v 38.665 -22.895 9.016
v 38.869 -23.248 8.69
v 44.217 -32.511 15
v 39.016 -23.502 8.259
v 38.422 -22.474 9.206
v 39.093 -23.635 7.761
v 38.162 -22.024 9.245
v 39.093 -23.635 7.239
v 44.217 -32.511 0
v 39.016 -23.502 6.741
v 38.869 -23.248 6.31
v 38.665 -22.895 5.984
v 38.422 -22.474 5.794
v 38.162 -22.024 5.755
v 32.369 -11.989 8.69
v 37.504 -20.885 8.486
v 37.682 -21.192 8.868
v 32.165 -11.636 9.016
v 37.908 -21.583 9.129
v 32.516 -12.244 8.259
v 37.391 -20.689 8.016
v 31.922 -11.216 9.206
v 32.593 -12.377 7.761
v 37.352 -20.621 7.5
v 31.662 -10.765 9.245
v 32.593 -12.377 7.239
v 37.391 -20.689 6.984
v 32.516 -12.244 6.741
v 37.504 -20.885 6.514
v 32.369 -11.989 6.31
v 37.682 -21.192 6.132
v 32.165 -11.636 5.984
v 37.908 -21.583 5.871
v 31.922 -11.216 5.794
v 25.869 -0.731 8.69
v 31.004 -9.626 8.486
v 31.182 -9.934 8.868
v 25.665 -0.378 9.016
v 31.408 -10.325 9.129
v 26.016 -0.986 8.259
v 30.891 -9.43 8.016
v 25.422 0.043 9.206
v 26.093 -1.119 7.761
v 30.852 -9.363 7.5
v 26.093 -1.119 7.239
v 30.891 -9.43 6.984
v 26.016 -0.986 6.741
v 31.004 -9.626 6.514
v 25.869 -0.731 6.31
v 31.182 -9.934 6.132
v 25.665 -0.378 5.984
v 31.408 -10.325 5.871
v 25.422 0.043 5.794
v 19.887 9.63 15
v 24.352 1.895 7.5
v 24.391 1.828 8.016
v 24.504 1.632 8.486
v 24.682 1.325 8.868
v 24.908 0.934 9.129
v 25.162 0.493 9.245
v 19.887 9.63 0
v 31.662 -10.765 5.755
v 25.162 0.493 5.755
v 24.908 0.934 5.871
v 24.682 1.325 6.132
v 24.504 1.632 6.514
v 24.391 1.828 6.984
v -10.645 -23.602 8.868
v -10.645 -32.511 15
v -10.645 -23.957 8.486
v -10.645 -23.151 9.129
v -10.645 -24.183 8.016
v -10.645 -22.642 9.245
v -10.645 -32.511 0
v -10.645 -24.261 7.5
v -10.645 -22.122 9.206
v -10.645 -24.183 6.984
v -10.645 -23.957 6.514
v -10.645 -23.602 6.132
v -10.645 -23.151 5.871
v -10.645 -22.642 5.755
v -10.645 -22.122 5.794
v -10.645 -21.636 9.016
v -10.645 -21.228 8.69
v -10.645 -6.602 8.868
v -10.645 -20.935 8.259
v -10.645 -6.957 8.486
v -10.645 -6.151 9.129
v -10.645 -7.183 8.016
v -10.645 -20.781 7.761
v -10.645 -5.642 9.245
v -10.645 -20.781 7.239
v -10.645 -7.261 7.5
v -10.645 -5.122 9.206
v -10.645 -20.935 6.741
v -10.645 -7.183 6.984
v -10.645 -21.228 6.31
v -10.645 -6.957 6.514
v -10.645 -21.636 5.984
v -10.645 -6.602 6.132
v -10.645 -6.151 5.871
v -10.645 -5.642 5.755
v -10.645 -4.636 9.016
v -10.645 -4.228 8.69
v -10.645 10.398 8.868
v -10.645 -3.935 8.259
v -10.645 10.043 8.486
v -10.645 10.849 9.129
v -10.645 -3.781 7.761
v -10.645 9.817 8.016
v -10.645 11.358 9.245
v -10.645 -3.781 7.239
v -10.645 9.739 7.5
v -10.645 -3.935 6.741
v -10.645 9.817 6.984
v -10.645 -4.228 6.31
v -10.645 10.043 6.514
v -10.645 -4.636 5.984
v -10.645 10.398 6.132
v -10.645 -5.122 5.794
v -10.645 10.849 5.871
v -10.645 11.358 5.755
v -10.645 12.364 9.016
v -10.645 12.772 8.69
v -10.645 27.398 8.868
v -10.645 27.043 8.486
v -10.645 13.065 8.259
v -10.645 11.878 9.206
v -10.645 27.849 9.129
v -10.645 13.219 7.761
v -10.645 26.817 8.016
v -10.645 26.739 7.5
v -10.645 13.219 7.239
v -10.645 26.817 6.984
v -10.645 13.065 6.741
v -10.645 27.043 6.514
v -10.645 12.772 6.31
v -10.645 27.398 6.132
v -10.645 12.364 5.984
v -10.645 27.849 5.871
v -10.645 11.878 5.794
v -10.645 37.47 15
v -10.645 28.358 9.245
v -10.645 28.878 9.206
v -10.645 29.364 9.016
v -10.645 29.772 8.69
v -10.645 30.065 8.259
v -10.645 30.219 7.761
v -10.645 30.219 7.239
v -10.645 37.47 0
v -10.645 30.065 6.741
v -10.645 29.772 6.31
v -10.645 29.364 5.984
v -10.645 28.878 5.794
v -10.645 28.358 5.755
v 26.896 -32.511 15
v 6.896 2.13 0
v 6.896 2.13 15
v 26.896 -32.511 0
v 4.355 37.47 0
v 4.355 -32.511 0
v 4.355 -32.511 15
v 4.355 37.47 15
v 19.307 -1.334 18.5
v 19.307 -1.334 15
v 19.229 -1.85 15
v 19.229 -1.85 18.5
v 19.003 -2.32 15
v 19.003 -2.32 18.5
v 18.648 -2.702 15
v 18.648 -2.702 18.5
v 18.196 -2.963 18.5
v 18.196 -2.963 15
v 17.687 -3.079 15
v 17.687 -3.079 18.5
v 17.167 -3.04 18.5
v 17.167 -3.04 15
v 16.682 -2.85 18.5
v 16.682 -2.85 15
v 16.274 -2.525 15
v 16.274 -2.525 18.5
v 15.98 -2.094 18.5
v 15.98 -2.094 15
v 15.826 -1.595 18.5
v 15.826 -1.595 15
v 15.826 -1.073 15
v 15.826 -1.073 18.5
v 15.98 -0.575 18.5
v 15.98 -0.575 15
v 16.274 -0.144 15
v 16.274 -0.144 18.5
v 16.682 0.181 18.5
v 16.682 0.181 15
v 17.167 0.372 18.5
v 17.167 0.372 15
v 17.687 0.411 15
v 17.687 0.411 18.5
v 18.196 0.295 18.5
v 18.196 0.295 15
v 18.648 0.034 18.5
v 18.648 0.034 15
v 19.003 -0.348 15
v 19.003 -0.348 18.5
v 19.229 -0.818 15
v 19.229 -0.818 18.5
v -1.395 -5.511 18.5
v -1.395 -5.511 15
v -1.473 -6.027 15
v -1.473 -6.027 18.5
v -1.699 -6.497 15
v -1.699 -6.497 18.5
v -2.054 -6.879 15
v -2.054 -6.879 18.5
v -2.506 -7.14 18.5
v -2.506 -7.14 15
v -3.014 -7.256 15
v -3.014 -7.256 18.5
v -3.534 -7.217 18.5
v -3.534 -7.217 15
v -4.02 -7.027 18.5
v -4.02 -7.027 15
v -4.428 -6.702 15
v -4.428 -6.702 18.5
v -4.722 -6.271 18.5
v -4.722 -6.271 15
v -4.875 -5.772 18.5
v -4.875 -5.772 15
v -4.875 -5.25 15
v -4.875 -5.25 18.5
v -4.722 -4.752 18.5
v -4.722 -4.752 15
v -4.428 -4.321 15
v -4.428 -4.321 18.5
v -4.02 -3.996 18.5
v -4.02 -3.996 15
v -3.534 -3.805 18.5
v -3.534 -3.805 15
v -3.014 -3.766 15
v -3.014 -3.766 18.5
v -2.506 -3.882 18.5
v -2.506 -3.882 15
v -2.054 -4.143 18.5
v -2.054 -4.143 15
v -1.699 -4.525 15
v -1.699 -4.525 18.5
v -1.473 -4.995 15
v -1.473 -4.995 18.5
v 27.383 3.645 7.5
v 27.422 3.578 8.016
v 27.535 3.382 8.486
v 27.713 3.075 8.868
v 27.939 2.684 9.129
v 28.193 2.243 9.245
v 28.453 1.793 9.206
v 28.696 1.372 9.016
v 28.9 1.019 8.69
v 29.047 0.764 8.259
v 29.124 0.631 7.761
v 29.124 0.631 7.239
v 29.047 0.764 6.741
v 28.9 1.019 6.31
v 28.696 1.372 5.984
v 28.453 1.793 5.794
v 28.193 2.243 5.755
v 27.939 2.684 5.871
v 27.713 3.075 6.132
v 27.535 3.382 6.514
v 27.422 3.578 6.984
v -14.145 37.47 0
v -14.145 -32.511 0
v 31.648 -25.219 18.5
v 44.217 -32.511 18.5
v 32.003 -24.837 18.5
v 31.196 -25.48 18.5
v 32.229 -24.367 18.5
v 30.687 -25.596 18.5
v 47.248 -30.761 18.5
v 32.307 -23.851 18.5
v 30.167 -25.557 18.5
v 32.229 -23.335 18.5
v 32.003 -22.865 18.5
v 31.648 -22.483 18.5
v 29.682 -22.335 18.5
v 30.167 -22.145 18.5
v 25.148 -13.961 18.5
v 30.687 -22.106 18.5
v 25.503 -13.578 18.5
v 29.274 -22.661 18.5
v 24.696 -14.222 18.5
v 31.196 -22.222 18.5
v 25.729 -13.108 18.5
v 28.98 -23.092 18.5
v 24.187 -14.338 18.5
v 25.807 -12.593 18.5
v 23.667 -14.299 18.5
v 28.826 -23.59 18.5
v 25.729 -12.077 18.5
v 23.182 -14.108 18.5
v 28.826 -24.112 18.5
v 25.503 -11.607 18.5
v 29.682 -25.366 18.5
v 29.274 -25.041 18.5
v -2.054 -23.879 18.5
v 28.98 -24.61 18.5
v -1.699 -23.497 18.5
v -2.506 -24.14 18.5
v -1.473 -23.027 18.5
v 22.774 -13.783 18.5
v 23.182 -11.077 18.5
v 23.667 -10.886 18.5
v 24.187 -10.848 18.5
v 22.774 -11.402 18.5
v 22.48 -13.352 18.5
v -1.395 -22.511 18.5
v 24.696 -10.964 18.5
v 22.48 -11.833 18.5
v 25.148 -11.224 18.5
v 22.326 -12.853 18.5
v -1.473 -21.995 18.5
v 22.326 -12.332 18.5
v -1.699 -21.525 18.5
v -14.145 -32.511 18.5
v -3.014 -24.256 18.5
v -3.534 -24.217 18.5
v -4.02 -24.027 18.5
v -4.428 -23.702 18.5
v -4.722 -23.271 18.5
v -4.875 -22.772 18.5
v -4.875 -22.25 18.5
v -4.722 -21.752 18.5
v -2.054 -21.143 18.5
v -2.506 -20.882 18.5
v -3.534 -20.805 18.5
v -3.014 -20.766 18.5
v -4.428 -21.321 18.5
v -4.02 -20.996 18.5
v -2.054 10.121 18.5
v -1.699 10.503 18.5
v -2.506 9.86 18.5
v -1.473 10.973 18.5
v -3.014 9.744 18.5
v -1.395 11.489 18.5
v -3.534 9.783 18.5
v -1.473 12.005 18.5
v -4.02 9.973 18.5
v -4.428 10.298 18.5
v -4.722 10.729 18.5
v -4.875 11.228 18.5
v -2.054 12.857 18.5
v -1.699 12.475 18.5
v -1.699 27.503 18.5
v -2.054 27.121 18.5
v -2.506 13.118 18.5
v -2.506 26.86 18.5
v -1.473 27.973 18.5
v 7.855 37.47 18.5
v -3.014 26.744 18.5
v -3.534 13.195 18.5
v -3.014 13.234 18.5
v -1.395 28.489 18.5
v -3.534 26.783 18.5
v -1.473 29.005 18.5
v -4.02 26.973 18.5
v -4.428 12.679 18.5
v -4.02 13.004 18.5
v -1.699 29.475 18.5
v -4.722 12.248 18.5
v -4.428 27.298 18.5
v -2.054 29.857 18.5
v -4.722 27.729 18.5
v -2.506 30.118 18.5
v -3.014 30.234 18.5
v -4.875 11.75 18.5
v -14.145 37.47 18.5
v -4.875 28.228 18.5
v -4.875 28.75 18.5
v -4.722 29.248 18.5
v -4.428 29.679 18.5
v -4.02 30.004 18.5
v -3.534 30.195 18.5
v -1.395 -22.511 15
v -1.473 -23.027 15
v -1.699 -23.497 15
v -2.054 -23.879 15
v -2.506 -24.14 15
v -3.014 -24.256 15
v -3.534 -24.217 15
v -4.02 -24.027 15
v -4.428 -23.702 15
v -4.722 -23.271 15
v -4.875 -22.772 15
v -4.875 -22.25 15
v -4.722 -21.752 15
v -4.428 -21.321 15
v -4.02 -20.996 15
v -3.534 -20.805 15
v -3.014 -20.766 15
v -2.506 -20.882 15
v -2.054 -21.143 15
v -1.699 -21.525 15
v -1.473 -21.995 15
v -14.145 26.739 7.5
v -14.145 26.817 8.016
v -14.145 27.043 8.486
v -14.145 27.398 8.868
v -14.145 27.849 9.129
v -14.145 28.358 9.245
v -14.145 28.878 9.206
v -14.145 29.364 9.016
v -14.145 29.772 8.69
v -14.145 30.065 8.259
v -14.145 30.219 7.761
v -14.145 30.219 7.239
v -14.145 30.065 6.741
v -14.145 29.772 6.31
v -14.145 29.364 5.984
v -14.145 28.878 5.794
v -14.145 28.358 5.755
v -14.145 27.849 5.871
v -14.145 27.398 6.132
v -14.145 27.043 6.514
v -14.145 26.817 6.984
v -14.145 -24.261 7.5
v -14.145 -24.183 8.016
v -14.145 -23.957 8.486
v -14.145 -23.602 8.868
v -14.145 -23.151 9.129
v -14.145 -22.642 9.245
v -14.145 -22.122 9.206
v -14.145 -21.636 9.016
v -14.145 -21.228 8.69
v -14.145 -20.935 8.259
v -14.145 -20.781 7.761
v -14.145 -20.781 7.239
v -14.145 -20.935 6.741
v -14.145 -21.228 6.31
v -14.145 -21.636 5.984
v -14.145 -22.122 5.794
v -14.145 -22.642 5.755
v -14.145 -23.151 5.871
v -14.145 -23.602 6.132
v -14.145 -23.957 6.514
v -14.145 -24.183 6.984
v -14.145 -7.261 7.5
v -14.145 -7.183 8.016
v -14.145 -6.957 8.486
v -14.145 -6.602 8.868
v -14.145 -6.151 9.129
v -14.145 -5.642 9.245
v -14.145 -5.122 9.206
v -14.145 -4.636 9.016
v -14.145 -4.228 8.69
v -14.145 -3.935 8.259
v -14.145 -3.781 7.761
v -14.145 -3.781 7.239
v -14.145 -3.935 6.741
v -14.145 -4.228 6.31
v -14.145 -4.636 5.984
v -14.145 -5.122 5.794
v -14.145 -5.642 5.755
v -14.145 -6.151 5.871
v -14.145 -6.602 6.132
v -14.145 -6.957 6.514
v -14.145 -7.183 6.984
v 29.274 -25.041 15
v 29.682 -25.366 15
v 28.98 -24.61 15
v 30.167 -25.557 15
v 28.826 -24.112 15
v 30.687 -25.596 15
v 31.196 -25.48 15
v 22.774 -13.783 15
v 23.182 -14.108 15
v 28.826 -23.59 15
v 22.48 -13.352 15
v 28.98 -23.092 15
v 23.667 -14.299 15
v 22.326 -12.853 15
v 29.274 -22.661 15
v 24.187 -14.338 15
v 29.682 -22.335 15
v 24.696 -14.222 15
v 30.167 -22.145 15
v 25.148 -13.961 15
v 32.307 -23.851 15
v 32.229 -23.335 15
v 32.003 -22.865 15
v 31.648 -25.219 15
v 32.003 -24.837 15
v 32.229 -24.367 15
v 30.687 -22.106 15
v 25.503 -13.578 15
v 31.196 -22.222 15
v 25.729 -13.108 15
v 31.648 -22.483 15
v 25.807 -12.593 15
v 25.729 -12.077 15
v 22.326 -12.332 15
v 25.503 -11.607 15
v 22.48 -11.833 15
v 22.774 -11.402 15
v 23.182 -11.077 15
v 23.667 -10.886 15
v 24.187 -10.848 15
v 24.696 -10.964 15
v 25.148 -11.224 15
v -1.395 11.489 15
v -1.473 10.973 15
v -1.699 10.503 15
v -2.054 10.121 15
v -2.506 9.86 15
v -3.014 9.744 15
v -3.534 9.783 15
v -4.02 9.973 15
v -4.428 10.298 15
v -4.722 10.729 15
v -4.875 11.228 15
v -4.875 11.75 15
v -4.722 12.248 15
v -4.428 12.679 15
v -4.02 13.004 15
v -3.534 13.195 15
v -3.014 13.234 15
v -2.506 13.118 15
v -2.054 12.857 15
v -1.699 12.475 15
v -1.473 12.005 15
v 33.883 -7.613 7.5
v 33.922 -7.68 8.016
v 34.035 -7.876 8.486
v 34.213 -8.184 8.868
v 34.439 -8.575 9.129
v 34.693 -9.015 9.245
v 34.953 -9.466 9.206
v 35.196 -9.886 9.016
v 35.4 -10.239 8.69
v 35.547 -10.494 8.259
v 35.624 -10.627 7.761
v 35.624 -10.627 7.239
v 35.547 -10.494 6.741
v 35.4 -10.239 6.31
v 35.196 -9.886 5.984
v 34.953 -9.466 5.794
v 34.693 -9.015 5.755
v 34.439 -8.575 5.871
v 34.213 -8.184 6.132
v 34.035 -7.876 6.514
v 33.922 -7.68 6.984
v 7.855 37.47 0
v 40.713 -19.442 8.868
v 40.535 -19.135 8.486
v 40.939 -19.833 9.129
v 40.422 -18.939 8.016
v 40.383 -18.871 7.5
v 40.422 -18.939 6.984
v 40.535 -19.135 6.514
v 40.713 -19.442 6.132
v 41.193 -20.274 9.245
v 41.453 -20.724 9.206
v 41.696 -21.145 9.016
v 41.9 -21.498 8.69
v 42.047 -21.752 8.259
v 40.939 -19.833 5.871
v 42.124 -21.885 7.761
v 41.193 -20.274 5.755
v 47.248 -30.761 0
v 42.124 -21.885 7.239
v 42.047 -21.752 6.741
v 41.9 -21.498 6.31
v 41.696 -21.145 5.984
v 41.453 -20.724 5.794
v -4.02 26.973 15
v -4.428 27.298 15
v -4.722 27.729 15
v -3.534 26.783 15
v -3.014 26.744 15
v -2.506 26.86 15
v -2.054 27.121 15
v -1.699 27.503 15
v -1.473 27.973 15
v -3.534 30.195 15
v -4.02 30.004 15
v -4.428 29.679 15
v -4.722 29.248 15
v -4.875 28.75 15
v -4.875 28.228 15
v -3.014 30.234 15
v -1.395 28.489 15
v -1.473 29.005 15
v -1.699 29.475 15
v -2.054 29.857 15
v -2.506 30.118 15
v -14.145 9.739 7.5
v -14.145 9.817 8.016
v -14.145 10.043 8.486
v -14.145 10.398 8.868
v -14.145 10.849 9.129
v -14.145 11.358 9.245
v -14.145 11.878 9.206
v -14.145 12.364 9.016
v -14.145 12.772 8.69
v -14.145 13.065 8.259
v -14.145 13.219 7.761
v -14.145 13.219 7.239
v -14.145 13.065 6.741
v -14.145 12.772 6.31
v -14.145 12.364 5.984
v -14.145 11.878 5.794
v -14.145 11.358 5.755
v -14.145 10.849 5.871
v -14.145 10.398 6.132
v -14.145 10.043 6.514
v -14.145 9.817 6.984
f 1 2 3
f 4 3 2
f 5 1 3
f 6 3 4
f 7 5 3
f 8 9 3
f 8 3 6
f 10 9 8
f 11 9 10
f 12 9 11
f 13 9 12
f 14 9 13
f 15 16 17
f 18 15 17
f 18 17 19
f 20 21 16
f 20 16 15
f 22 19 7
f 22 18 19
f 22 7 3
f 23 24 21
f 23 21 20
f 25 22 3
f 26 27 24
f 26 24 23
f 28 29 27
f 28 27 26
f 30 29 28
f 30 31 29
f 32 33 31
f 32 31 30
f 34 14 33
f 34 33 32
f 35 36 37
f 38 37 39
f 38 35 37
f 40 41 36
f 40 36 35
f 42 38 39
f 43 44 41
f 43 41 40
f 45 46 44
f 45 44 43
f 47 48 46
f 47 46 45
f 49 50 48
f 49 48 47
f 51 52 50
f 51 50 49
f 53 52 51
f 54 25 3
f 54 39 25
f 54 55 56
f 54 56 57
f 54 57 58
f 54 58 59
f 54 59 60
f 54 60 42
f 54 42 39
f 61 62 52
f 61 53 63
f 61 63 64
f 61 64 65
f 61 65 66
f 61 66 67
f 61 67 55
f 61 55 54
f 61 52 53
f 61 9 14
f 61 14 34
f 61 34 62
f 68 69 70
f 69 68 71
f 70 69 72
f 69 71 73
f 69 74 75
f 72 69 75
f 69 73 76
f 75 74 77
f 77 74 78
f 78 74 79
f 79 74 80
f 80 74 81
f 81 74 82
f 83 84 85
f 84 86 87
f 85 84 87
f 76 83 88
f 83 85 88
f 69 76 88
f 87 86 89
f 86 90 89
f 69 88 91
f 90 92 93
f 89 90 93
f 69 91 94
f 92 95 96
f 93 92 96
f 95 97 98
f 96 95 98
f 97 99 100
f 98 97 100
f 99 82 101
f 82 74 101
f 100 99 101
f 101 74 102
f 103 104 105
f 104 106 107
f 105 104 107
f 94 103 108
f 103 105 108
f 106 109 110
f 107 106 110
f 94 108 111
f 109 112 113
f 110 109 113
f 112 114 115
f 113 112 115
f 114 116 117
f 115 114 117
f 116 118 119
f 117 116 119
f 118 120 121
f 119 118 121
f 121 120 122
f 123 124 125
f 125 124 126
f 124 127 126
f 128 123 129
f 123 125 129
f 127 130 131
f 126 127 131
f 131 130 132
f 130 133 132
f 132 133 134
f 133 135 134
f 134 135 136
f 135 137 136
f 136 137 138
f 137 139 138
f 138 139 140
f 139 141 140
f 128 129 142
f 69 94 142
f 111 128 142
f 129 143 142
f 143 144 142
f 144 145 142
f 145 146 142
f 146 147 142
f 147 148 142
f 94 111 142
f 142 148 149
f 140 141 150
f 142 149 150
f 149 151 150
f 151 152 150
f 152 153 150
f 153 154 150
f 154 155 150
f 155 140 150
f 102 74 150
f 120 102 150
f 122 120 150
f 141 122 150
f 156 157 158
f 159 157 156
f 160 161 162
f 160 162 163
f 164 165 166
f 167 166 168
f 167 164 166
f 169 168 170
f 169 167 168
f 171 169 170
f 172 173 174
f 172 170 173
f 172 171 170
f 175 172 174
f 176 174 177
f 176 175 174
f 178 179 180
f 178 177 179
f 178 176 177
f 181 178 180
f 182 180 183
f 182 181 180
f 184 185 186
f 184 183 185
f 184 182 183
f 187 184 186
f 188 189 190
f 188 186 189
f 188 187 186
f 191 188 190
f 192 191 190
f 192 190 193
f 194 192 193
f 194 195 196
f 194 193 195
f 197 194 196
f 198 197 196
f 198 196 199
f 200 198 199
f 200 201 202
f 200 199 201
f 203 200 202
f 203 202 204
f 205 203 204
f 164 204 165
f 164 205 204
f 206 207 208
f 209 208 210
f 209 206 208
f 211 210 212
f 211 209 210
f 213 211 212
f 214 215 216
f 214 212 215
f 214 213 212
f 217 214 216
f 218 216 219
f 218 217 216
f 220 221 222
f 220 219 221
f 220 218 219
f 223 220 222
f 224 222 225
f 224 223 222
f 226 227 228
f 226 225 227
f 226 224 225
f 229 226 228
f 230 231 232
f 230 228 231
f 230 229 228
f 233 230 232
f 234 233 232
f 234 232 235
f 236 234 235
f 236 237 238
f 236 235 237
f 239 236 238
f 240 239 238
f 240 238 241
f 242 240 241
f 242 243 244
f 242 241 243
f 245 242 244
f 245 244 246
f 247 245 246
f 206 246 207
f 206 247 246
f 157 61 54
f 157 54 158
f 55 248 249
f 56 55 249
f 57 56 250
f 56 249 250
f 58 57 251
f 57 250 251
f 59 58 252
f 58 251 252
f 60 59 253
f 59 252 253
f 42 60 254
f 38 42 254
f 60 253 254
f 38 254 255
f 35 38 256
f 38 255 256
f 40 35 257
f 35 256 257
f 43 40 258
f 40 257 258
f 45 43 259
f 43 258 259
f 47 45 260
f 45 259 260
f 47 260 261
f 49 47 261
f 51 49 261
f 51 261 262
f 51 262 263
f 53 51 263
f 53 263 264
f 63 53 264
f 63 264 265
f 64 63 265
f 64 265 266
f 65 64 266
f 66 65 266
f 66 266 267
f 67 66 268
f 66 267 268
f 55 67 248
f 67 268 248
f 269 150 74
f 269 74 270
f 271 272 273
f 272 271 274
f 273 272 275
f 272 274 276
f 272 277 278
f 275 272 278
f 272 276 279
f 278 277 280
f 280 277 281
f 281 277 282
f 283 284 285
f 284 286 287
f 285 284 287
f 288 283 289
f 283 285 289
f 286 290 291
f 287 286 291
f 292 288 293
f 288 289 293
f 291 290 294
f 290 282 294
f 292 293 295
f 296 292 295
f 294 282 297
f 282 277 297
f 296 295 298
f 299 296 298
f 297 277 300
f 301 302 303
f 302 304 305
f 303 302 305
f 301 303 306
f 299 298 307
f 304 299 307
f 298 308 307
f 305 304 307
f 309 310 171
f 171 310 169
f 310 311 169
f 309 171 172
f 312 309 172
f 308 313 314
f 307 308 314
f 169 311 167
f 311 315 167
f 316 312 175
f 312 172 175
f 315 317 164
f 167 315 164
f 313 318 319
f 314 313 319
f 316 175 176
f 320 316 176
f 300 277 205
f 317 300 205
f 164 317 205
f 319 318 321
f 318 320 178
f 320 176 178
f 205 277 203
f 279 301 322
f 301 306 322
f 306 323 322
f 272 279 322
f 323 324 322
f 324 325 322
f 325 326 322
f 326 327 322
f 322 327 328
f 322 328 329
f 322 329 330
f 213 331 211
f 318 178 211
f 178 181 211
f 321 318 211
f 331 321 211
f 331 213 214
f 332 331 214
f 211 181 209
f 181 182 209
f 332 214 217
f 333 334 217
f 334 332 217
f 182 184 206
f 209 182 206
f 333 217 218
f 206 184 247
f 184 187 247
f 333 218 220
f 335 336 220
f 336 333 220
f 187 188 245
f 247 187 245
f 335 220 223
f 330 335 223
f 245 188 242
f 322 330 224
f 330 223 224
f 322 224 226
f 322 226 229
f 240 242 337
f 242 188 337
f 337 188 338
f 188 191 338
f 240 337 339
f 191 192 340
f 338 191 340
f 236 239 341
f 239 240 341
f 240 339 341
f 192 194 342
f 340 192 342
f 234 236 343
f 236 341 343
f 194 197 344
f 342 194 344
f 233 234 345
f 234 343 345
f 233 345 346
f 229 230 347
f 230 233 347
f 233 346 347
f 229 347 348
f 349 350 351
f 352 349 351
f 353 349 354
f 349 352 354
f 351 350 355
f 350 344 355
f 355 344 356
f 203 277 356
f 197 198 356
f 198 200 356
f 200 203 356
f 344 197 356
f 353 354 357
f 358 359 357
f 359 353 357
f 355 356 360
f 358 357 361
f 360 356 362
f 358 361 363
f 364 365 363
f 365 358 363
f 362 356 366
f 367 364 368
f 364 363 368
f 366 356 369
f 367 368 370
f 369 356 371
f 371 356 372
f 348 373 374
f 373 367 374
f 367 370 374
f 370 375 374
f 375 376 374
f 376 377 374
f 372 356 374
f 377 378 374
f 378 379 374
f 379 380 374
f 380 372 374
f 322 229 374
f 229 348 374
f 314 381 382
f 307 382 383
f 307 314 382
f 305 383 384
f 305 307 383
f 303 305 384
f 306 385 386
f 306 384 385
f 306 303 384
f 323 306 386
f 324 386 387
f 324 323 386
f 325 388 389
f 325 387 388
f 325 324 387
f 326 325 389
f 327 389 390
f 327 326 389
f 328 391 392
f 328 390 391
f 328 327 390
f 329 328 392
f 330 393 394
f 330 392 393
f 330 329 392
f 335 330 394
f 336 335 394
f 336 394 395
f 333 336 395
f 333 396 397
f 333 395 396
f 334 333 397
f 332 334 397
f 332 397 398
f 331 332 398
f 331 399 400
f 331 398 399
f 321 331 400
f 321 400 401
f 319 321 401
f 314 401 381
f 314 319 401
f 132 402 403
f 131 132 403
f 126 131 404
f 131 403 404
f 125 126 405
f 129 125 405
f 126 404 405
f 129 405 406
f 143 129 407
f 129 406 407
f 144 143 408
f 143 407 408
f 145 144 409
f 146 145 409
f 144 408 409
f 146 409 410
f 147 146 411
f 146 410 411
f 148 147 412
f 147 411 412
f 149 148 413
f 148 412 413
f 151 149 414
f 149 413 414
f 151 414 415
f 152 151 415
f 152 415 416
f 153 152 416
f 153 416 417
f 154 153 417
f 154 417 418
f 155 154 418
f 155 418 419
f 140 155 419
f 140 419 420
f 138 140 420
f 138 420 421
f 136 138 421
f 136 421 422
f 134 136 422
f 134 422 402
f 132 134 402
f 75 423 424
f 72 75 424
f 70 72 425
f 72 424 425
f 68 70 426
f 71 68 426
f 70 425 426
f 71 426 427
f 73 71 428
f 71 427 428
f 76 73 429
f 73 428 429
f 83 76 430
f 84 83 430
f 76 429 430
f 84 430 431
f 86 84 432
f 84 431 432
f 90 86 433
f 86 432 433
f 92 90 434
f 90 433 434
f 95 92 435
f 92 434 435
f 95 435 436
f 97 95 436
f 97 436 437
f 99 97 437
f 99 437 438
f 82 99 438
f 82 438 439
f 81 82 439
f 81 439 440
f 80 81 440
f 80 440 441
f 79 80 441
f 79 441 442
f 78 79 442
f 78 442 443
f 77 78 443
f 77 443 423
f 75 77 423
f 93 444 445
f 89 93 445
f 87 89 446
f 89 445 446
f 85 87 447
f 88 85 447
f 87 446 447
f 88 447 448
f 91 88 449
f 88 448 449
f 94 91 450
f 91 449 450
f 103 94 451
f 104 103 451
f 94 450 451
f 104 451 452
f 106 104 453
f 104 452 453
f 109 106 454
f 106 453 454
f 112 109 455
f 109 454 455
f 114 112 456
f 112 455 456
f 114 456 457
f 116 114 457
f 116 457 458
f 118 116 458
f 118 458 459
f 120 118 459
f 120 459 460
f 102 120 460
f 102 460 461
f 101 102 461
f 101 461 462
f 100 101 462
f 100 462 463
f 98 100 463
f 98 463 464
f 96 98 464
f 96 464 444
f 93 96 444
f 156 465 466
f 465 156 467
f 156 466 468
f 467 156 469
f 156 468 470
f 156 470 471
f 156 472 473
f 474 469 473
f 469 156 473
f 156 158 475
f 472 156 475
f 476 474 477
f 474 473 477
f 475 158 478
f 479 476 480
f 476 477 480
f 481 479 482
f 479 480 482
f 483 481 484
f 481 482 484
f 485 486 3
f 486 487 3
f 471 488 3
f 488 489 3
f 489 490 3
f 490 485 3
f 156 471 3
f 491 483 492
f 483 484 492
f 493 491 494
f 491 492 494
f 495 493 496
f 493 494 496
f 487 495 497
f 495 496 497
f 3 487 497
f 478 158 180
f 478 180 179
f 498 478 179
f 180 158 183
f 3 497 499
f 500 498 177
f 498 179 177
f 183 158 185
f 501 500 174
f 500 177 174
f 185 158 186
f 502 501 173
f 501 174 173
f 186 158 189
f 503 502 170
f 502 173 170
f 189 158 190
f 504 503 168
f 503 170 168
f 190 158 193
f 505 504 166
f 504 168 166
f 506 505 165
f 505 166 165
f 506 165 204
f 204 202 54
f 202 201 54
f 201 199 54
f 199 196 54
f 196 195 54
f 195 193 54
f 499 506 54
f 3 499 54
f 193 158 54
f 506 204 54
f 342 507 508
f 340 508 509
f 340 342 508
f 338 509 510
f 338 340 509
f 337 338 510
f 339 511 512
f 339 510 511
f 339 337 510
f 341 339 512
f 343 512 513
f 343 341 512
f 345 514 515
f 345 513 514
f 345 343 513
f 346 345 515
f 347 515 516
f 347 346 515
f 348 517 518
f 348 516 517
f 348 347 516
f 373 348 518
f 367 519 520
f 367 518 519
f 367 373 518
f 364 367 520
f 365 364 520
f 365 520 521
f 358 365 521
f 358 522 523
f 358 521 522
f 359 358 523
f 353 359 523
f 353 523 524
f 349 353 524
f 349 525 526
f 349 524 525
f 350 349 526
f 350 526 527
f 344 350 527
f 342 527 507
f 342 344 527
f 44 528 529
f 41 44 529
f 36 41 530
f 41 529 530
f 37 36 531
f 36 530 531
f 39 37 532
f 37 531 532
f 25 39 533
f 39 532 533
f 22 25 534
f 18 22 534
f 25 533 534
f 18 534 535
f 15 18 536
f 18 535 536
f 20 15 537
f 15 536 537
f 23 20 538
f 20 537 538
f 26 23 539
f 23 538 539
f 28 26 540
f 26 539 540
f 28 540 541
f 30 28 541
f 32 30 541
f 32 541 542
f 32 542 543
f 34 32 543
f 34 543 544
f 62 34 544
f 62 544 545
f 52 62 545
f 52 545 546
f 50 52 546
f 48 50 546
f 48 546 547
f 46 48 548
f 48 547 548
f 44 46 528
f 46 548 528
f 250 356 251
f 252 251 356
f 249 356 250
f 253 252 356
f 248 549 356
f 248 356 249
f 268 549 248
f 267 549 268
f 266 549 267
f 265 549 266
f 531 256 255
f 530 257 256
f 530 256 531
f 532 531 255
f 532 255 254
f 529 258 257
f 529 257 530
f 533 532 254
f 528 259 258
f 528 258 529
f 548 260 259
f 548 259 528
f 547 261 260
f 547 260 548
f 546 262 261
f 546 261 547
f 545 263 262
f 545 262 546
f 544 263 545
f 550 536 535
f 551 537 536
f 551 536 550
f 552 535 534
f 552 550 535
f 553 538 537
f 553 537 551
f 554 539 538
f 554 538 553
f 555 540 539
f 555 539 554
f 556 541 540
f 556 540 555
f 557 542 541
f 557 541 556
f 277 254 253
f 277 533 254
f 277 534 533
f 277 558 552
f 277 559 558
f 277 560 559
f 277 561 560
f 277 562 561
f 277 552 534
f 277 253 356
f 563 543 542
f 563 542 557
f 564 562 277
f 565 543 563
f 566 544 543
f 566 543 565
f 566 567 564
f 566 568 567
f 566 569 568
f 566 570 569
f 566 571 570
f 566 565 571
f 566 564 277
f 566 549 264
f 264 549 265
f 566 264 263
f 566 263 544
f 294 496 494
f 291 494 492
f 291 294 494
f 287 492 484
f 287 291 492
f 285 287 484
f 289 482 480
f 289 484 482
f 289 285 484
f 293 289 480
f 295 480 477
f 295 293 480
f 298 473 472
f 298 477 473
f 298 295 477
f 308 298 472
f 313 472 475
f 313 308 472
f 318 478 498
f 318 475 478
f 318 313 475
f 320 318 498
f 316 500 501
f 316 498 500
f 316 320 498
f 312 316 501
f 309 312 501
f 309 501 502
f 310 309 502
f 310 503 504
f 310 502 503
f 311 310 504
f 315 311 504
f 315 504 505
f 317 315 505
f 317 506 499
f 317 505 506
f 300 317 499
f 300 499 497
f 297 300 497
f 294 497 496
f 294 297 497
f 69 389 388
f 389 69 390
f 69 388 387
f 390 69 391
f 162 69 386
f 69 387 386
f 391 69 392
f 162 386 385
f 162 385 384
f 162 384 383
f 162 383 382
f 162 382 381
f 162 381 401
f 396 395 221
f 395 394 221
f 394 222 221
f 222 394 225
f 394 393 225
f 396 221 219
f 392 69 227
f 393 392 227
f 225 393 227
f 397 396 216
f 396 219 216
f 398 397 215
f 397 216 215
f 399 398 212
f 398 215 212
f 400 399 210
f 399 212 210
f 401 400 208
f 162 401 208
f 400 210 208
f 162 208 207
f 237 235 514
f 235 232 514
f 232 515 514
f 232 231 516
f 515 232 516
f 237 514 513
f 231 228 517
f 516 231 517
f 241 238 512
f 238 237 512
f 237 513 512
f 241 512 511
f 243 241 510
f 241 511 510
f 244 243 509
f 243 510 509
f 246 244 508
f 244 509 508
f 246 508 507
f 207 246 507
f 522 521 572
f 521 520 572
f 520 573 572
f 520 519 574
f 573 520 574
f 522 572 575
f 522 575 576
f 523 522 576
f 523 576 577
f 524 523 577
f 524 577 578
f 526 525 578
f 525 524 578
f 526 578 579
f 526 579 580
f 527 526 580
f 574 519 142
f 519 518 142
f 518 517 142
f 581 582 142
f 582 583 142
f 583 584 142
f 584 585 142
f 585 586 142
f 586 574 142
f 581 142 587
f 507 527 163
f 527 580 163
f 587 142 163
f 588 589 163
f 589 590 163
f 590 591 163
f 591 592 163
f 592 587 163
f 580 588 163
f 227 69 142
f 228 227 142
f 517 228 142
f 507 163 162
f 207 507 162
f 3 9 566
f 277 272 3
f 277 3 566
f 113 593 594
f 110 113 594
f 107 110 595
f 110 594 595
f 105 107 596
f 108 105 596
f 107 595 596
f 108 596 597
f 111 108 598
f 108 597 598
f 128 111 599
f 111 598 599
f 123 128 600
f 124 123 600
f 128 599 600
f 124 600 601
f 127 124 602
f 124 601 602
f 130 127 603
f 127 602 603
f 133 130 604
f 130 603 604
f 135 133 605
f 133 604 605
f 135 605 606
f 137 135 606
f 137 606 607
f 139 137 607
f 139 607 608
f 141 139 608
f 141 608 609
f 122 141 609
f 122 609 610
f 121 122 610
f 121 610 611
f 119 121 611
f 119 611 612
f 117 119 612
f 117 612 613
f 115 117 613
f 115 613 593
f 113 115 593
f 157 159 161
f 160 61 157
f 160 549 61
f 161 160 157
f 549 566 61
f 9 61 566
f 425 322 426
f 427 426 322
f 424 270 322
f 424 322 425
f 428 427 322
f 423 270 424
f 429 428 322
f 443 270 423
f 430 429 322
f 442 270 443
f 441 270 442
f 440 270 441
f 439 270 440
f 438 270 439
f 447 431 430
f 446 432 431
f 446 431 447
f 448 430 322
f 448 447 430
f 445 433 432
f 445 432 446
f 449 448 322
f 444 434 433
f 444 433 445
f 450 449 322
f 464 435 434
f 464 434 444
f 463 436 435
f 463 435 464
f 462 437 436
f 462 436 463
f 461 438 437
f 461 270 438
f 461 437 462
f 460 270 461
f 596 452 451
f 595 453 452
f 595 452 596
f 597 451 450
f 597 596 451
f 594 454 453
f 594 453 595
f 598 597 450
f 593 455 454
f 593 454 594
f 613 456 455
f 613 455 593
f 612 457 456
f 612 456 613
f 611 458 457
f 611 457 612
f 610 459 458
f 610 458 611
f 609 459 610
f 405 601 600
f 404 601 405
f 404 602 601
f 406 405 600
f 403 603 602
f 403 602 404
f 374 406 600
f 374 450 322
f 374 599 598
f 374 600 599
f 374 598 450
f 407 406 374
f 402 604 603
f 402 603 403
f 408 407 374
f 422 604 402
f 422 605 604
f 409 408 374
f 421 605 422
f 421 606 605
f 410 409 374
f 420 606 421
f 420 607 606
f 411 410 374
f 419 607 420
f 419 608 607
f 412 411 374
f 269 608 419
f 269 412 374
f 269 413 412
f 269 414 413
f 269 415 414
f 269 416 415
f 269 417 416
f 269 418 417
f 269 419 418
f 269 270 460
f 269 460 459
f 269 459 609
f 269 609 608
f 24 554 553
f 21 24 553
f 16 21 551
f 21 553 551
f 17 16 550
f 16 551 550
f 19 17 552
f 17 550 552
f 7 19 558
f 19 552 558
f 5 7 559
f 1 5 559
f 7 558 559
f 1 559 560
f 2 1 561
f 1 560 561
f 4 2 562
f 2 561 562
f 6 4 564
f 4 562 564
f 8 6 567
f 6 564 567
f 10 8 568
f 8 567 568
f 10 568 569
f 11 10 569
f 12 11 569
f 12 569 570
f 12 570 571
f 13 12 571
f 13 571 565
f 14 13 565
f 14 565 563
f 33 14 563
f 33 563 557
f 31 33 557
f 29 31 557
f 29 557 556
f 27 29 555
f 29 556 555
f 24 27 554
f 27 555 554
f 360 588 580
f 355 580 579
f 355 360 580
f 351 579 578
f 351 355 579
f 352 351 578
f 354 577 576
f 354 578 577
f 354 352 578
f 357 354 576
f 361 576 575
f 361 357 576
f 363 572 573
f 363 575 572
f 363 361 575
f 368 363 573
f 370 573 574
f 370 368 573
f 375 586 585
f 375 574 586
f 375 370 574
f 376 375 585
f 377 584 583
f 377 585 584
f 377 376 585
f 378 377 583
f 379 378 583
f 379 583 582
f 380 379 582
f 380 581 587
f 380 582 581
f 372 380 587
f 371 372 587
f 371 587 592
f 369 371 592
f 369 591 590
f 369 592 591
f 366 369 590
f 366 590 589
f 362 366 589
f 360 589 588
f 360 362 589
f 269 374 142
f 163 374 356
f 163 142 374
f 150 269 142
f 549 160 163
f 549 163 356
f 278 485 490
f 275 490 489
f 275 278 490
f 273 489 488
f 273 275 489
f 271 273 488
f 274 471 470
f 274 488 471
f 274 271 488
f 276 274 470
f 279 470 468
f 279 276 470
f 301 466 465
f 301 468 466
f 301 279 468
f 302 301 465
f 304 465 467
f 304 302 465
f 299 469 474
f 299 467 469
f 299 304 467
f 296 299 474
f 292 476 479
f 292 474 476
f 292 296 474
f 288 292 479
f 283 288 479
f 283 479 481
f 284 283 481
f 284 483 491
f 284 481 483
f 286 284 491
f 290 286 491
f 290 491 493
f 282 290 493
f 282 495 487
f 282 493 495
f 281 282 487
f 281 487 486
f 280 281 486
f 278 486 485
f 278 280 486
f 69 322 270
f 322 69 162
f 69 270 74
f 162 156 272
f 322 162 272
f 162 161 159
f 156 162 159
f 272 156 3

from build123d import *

# Parameters (mm, degrees)
BOSS_EXTRUDE1_DEPTH = 18.5
SKETCH2_W           = 15
SKETCH2_H           = 69.980762113
CUT_EXTRUDE1_DEPTH  = 15
SKETCH3_R           = 1.75
CUT_EXTRUDE2_DEPTH  = 3.5
SKETCH4_R           = 1.75
CUT_EXTRUDE3_DEPTH  = 4
SKETCH5_R           = 1.75
CUT_EXTRUDE4_DEPTH  = 4
CUT_EXTRUDE5_DEPTH  = 19


with BuildPart() as part:
    # Sketch1 → Boss-Extrude1 (new body)
    with BuildSketch(Plane.XY):
        Polygon((7.85498998, 37.469557102), (48.258401824, -32.511205011), (7.85498998, -32.511205011), (-14.14501002, -32.511205011), (-14.14501002, 37.469557102), align=None)
    extrude(amount=BOSS_EXTRUDE1_DEPTH)

    # Sketch2 → Cut-Extrude1 (cut)
    with BuildSketch(Plane.XY):
        with Locations((-3.14501002, 2.479176046)):
            Rectangle(SKETCH2_W, SKETCH2_H)
        Polygon((44.21694994, -32.511205011), (19.886822921, 9.62981114), (6.896441864, 2.12981114), (26.896441864, -32.511205011), align=None)
    extrude(amount=CUT_EXTRUDE1_DEPTH, mode=Mode.SUBTRACT)

    # Sketch3 → Cut-Extrude2 (cut)
    with BuildSketch(Plane(origin=(22.116036645, 12.76869971, 0), x_dir=(0, 0, -1), z_dir=(0.8660254037844378, 0.5000000000000016, 0))):
        with Locations(Location((-7.5, -38.284730359, 0), (0, 0, 90))):
            Circle(SKETCH3_R)
        with Locations(Location((-7.5, -25.284730359, 0), (0, 0, 90))):
            Circle(SKETCH3_R)
        with Locations(Location((-7.5, -12.284730359, 0), (0, 0, 90))):
            Circle(SKETCH3_R)
    extrude(amount=-CUT_EXTRUDE2_DEPTH, mode=Mode.SUBTRACT)

    # Sketch4 → Cut-Extrude3 (cut)
    with BuildSketch(Plane(origin=(0, 0, 18.5), x_dir=(-1, 0, 0), z_dir=(0, 0, -1))):
        with Locations(Location((-30.556695902, -23.850950973, 0), (0, 0, 180))):
            Circle(SKETCH4_R)
        with Locations(Location((-24.056695902, -12.592620724, 0), (0, 0, 180))):
            Circle(SKETCH4_R)
        with Locations(Location((-17.556695902, -1.334290475, 0), (0, 0, 180))):
            Circle(SKETCH4_R)
        with Locations(Location((3.14501002, -5.511205011, 0), (0, 0, 180))):
            Circle(SKETCH4_R)
        with Locations(Location((3.14501002, 11.488794989, 0), (0, 0, 180))):
            Circle(SKETCH4_R)
        with Locations(Location((3.14501002, 28.488794989, 0), (0, 0, 180))):
            Circle(SKETCH4_R)
        with Locations(Location((3.14501002, -22.511205011, 0), (0, 0, 180))):
            Circle(SKETCH4_R)
    extrude(amount=CUT_EXTRUDE3_DEPTH, mode=Mode.SUBTRACT)

    # Sketch5 → Cut-Extrude4 (cut)
    with BuildSketch(Plane.ZY.offset(14.14501002)):
        with Locations(Location((7.5, -22.511205011, 0), (0, 0, 270))):
            Circle(SKETCH5_R)
        with Locations(Location((7.5, -5.511205011, 0), (0, 0, 270))):
            Circle(SKETCH5_R)
        with Locations(Location((7.5, 11.488794989, 0), (0, 0, 270))):
            Circle(SKETCH5_R)
        with Locations(Location((7.5, 28.488794989, 0), (0, 0, 270))):
            Circle(SKETCH5_R)
    extrude(amount=-CUT_EXTRUDE4_DEPTH, mode=Mode.SUBTRACT)

    # Sketch6 → Cut-Extrude5 (cut)
    with BuildSketch(Plane.XY.offset(18.5)):
        Polygon((44.21694994, -32.511205011), (47.248038853, -30.761205011), (48.258401824, -32.511205011), align=None)
    extrude(amount=-CUT_EXTRUDE5_DEPTH, mode=Mode.SUBTRACT)


solid = part.part
